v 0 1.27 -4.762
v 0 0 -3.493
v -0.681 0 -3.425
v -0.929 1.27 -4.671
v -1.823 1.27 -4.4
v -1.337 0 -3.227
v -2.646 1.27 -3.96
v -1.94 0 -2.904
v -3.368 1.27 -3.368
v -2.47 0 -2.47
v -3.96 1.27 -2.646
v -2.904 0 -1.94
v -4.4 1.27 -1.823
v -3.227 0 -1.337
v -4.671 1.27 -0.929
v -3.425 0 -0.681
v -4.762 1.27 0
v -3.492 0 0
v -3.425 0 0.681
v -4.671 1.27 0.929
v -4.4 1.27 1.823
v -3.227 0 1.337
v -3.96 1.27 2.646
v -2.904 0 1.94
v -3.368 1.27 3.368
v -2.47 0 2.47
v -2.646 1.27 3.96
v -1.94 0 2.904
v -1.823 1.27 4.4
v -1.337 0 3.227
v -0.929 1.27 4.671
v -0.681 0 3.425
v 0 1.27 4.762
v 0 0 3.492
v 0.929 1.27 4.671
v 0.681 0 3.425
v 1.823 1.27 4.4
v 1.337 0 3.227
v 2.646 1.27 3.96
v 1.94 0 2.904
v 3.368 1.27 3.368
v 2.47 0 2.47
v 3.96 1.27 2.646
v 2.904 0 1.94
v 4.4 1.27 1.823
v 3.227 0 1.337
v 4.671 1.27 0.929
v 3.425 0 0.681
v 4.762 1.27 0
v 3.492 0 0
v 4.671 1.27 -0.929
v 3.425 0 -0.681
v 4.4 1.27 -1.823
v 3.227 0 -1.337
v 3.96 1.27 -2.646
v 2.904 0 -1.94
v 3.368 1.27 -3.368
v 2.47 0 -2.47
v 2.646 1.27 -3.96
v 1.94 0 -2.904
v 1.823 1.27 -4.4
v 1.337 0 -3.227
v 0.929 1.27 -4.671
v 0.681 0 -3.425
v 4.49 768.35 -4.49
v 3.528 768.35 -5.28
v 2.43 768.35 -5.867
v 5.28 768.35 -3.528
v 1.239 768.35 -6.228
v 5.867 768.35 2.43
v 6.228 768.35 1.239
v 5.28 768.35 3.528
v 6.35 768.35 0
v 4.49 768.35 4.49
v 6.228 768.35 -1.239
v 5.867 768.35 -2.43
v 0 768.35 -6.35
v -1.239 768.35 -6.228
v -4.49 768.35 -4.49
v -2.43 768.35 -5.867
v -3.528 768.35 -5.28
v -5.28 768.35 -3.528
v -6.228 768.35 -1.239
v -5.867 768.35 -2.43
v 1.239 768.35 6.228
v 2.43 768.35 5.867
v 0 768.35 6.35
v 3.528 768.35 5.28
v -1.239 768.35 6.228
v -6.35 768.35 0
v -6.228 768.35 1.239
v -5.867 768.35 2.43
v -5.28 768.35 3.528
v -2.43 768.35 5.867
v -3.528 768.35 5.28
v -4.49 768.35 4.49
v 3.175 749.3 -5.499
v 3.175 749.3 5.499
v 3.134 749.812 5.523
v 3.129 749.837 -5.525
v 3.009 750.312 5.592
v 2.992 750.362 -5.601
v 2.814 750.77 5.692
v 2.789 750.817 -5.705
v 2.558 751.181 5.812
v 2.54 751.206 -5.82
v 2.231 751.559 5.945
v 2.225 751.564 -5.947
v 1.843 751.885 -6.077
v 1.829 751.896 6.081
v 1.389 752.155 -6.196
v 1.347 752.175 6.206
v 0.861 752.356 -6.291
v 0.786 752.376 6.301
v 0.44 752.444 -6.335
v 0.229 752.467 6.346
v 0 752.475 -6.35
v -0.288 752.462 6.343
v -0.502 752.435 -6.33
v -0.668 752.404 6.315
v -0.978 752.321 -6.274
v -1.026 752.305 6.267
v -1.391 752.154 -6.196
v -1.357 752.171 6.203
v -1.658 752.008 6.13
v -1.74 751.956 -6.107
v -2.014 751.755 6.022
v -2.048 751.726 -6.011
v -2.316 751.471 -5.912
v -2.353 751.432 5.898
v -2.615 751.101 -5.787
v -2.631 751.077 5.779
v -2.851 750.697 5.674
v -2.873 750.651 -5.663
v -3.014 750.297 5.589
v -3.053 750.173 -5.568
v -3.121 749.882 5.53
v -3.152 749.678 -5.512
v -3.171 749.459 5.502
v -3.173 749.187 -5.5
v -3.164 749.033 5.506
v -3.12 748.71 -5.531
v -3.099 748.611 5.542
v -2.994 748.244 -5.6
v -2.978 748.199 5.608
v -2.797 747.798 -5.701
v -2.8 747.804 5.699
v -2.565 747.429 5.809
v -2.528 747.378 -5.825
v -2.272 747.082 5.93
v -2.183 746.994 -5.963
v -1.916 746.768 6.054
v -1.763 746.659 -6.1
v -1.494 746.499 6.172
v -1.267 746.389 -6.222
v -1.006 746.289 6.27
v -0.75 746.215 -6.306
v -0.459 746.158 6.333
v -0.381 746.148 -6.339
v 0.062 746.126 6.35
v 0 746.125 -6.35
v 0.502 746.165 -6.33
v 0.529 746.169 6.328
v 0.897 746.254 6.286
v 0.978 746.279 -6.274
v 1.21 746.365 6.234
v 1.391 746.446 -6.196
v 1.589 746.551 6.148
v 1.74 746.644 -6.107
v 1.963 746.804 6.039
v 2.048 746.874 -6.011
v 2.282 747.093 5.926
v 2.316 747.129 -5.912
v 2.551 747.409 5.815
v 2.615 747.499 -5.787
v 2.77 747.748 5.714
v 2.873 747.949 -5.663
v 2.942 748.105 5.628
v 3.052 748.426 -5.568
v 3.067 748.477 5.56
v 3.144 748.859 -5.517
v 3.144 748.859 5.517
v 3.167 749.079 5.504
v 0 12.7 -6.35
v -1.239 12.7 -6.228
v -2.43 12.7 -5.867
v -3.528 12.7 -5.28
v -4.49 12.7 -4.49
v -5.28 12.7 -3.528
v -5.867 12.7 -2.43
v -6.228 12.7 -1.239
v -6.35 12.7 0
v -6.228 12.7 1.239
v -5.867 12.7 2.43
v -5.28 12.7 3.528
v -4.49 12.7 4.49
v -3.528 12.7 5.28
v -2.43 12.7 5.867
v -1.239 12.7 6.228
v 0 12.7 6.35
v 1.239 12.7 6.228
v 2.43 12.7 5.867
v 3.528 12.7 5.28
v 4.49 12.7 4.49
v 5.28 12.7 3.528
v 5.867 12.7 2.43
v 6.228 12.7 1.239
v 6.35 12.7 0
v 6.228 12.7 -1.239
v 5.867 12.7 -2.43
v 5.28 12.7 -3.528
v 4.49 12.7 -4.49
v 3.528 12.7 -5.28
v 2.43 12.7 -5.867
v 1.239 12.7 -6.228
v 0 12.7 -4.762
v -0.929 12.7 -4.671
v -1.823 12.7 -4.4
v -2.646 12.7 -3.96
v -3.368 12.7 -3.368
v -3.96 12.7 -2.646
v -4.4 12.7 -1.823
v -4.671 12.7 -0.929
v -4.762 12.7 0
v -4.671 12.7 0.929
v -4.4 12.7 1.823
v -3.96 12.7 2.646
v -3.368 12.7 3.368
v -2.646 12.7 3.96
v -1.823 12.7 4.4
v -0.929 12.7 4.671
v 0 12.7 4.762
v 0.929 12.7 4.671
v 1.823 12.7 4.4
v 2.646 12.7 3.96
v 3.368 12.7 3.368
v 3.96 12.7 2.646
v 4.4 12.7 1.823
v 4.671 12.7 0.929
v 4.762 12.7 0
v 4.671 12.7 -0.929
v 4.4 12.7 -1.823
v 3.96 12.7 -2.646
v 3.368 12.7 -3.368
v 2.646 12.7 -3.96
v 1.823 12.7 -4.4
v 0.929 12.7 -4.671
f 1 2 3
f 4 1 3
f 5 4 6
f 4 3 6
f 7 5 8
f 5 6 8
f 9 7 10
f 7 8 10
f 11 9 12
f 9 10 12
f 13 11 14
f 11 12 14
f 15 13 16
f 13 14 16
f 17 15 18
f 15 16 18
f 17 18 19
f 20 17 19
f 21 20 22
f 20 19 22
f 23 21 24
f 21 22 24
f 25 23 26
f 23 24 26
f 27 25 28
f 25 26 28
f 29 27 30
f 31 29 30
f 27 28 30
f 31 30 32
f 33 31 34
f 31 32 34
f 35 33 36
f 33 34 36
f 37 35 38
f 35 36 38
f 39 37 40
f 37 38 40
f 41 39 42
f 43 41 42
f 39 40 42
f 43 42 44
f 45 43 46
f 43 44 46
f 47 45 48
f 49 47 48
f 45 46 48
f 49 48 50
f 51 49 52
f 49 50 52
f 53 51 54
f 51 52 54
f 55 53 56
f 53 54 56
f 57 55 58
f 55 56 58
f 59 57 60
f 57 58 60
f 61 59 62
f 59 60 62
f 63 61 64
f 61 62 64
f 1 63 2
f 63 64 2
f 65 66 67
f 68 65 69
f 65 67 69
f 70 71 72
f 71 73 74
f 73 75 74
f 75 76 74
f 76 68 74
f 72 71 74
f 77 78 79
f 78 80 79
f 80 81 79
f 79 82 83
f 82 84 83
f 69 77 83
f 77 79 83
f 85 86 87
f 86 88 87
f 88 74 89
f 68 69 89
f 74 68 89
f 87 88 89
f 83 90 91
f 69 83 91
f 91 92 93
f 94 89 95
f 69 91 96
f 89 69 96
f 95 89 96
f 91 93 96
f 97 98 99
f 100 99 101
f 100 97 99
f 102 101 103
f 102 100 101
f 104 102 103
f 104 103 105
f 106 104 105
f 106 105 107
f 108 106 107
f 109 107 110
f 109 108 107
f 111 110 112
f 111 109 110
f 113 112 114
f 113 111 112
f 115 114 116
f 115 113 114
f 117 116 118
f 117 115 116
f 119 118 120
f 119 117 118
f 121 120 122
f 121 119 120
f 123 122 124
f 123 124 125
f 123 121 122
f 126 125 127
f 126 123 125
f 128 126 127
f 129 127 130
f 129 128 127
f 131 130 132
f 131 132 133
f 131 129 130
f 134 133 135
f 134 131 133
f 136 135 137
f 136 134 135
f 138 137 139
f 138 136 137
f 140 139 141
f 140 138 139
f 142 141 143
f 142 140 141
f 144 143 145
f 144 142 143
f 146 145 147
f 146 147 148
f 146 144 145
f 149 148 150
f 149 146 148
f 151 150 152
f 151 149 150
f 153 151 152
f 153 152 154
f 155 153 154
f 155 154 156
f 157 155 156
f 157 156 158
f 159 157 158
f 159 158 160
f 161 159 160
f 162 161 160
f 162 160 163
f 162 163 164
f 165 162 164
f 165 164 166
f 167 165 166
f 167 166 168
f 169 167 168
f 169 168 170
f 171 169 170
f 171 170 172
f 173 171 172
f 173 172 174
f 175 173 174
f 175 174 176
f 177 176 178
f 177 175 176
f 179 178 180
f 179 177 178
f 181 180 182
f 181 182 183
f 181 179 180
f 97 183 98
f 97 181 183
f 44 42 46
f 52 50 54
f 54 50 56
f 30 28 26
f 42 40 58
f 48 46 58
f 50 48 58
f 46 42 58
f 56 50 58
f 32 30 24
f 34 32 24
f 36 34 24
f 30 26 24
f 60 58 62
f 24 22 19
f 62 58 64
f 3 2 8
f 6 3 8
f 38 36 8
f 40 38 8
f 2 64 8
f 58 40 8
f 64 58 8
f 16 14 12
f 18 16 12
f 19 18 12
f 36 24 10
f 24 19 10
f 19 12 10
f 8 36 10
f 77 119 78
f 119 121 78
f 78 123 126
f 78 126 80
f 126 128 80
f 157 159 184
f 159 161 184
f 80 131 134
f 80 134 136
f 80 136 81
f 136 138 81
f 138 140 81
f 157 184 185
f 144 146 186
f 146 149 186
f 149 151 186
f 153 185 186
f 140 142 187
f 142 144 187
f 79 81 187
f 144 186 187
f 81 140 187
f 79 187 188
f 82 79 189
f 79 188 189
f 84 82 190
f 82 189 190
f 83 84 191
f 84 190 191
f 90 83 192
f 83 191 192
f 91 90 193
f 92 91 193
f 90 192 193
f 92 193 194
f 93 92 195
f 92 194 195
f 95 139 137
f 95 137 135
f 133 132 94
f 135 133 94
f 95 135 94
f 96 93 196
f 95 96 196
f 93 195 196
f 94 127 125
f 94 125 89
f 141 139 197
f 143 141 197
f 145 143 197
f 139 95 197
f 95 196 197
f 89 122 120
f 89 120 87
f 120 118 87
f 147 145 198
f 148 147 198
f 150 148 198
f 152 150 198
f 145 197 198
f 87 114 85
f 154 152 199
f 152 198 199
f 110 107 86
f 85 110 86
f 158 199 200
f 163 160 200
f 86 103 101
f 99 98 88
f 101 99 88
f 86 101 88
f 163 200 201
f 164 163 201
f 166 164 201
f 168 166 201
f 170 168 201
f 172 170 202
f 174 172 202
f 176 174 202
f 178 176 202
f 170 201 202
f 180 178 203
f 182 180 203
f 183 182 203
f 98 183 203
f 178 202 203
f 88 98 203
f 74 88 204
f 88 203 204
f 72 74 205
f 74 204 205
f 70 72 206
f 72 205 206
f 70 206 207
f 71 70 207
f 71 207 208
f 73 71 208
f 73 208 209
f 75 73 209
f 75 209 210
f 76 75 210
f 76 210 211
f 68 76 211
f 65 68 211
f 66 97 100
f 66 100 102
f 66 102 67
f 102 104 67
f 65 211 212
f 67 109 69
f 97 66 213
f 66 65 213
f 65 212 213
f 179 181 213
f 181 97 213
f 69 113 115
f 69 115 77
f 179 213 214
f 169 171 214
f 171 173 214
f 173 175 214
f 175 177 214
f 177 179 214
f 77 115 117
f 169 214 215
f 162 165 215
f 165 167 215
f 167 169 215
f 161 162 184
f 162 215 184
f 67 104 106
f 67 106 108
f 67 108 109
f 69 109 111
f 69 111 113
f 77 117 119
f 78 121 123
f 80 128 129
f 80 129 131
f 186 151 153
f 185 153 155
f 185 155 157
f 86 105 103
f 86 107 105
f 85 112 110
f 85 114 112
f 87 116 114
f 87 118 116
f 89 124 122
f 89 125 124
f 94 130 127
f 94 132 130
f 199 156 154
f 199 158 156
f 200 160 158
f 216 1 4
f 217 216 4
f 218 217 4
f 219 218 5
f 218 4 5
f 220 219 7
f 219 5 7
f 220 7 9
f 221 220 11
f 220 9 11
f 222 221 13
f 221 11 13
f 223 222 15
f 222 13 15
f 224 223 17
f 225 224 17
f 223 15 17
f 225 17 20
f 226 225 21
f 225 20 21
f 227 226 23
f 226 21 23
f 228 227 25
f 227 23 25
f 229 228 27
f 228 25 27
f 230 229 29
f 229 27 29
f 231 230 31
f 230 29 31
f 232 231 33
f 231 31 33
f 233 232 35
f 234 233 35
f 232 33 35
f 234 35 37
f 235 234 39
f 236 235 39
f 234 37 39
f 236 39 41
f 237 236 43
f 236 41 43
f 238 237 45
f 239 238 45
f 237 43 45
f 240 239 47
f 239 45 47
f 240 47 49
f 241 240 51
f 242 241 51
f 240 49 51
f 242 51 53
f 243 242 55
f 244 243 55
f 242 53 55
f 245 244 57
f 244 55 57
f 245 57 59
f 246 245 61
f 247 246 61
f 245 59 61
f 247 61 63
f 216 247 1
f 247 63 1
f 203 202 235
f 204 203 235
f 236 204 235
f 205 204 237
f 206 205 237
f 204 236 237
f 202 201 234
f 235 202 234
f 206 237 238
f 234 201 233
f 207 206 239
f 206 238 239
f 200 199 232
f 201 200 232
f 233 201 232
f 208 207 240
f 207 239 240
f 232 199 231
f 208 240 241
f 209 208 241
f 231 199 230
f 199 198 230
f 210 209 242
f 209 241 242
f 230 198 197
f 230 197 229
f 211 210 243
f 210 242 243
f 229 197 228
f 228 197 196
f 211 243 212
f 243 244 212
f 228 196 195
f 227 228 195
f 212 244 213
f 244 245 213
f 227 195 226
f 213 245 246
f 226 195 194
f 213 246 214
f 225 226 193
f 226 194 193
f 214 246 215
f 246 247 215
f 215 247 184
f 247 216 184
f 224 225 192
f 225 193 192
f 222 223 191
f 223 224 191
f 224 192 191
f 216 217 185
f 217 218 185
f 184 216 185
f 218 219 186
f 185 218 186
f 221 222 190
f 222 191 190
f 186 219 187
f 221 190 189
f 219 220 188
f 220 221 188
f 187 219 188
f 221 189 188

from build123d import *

# Parameters (mm, degrees)
CHAMFER1_SIZE           = 1.27
CUT_EXTRUDE1_DEPTH      = 769.402477547
CUT_EXTRUDE1_DEPTH_BACK = 769.402477547
SKETCH2_R               = 3.175


with BuildPart() as part:
    # Sketch1 → Revolve1 (revolve)
    with BuildSketch(Plane.XY, mode=Mode.PRIVATE) as revolve1_sk:
        Polygon((0, 0), (0, 768.35), (-6.35, 768.35), (-6.35, 12.7), (-4.7625, 12.7), (-4.7625, 0), align=None)
    revolve(revolve1_sk.sketch.rotate(Axis((0, 0, 0), (0, 1, 0)), 270), axis=Axis((0, 0, 0), (0, 1, 0)))

    # Chamfer1
    chamfer1_edges = [part.edges().sort_by_distance(p)[0] for p in [
        (0, 0, 4.7625),
    ]]
    chamfer(chamfer1_edges, length=CHAMFER1_SIZE)

    # Sketch2 → Cut-Extrude1 (cut, two sides: drawn at the far end of the back side and taken through both)
    with BuildSketch(Plane.XY.offset(-CUT_EXTRUDE1_DEPTH_BACK)):
        with Locations((0, 749.3)):
            Circle(SKETCH2_R)
    extrude(amount=CUT_EXTRUDE1_DEPTH + CUT_EXTRUDE1_DEPTH_BACK, mode=Mode.SUBTRACT)


solid = part.part
